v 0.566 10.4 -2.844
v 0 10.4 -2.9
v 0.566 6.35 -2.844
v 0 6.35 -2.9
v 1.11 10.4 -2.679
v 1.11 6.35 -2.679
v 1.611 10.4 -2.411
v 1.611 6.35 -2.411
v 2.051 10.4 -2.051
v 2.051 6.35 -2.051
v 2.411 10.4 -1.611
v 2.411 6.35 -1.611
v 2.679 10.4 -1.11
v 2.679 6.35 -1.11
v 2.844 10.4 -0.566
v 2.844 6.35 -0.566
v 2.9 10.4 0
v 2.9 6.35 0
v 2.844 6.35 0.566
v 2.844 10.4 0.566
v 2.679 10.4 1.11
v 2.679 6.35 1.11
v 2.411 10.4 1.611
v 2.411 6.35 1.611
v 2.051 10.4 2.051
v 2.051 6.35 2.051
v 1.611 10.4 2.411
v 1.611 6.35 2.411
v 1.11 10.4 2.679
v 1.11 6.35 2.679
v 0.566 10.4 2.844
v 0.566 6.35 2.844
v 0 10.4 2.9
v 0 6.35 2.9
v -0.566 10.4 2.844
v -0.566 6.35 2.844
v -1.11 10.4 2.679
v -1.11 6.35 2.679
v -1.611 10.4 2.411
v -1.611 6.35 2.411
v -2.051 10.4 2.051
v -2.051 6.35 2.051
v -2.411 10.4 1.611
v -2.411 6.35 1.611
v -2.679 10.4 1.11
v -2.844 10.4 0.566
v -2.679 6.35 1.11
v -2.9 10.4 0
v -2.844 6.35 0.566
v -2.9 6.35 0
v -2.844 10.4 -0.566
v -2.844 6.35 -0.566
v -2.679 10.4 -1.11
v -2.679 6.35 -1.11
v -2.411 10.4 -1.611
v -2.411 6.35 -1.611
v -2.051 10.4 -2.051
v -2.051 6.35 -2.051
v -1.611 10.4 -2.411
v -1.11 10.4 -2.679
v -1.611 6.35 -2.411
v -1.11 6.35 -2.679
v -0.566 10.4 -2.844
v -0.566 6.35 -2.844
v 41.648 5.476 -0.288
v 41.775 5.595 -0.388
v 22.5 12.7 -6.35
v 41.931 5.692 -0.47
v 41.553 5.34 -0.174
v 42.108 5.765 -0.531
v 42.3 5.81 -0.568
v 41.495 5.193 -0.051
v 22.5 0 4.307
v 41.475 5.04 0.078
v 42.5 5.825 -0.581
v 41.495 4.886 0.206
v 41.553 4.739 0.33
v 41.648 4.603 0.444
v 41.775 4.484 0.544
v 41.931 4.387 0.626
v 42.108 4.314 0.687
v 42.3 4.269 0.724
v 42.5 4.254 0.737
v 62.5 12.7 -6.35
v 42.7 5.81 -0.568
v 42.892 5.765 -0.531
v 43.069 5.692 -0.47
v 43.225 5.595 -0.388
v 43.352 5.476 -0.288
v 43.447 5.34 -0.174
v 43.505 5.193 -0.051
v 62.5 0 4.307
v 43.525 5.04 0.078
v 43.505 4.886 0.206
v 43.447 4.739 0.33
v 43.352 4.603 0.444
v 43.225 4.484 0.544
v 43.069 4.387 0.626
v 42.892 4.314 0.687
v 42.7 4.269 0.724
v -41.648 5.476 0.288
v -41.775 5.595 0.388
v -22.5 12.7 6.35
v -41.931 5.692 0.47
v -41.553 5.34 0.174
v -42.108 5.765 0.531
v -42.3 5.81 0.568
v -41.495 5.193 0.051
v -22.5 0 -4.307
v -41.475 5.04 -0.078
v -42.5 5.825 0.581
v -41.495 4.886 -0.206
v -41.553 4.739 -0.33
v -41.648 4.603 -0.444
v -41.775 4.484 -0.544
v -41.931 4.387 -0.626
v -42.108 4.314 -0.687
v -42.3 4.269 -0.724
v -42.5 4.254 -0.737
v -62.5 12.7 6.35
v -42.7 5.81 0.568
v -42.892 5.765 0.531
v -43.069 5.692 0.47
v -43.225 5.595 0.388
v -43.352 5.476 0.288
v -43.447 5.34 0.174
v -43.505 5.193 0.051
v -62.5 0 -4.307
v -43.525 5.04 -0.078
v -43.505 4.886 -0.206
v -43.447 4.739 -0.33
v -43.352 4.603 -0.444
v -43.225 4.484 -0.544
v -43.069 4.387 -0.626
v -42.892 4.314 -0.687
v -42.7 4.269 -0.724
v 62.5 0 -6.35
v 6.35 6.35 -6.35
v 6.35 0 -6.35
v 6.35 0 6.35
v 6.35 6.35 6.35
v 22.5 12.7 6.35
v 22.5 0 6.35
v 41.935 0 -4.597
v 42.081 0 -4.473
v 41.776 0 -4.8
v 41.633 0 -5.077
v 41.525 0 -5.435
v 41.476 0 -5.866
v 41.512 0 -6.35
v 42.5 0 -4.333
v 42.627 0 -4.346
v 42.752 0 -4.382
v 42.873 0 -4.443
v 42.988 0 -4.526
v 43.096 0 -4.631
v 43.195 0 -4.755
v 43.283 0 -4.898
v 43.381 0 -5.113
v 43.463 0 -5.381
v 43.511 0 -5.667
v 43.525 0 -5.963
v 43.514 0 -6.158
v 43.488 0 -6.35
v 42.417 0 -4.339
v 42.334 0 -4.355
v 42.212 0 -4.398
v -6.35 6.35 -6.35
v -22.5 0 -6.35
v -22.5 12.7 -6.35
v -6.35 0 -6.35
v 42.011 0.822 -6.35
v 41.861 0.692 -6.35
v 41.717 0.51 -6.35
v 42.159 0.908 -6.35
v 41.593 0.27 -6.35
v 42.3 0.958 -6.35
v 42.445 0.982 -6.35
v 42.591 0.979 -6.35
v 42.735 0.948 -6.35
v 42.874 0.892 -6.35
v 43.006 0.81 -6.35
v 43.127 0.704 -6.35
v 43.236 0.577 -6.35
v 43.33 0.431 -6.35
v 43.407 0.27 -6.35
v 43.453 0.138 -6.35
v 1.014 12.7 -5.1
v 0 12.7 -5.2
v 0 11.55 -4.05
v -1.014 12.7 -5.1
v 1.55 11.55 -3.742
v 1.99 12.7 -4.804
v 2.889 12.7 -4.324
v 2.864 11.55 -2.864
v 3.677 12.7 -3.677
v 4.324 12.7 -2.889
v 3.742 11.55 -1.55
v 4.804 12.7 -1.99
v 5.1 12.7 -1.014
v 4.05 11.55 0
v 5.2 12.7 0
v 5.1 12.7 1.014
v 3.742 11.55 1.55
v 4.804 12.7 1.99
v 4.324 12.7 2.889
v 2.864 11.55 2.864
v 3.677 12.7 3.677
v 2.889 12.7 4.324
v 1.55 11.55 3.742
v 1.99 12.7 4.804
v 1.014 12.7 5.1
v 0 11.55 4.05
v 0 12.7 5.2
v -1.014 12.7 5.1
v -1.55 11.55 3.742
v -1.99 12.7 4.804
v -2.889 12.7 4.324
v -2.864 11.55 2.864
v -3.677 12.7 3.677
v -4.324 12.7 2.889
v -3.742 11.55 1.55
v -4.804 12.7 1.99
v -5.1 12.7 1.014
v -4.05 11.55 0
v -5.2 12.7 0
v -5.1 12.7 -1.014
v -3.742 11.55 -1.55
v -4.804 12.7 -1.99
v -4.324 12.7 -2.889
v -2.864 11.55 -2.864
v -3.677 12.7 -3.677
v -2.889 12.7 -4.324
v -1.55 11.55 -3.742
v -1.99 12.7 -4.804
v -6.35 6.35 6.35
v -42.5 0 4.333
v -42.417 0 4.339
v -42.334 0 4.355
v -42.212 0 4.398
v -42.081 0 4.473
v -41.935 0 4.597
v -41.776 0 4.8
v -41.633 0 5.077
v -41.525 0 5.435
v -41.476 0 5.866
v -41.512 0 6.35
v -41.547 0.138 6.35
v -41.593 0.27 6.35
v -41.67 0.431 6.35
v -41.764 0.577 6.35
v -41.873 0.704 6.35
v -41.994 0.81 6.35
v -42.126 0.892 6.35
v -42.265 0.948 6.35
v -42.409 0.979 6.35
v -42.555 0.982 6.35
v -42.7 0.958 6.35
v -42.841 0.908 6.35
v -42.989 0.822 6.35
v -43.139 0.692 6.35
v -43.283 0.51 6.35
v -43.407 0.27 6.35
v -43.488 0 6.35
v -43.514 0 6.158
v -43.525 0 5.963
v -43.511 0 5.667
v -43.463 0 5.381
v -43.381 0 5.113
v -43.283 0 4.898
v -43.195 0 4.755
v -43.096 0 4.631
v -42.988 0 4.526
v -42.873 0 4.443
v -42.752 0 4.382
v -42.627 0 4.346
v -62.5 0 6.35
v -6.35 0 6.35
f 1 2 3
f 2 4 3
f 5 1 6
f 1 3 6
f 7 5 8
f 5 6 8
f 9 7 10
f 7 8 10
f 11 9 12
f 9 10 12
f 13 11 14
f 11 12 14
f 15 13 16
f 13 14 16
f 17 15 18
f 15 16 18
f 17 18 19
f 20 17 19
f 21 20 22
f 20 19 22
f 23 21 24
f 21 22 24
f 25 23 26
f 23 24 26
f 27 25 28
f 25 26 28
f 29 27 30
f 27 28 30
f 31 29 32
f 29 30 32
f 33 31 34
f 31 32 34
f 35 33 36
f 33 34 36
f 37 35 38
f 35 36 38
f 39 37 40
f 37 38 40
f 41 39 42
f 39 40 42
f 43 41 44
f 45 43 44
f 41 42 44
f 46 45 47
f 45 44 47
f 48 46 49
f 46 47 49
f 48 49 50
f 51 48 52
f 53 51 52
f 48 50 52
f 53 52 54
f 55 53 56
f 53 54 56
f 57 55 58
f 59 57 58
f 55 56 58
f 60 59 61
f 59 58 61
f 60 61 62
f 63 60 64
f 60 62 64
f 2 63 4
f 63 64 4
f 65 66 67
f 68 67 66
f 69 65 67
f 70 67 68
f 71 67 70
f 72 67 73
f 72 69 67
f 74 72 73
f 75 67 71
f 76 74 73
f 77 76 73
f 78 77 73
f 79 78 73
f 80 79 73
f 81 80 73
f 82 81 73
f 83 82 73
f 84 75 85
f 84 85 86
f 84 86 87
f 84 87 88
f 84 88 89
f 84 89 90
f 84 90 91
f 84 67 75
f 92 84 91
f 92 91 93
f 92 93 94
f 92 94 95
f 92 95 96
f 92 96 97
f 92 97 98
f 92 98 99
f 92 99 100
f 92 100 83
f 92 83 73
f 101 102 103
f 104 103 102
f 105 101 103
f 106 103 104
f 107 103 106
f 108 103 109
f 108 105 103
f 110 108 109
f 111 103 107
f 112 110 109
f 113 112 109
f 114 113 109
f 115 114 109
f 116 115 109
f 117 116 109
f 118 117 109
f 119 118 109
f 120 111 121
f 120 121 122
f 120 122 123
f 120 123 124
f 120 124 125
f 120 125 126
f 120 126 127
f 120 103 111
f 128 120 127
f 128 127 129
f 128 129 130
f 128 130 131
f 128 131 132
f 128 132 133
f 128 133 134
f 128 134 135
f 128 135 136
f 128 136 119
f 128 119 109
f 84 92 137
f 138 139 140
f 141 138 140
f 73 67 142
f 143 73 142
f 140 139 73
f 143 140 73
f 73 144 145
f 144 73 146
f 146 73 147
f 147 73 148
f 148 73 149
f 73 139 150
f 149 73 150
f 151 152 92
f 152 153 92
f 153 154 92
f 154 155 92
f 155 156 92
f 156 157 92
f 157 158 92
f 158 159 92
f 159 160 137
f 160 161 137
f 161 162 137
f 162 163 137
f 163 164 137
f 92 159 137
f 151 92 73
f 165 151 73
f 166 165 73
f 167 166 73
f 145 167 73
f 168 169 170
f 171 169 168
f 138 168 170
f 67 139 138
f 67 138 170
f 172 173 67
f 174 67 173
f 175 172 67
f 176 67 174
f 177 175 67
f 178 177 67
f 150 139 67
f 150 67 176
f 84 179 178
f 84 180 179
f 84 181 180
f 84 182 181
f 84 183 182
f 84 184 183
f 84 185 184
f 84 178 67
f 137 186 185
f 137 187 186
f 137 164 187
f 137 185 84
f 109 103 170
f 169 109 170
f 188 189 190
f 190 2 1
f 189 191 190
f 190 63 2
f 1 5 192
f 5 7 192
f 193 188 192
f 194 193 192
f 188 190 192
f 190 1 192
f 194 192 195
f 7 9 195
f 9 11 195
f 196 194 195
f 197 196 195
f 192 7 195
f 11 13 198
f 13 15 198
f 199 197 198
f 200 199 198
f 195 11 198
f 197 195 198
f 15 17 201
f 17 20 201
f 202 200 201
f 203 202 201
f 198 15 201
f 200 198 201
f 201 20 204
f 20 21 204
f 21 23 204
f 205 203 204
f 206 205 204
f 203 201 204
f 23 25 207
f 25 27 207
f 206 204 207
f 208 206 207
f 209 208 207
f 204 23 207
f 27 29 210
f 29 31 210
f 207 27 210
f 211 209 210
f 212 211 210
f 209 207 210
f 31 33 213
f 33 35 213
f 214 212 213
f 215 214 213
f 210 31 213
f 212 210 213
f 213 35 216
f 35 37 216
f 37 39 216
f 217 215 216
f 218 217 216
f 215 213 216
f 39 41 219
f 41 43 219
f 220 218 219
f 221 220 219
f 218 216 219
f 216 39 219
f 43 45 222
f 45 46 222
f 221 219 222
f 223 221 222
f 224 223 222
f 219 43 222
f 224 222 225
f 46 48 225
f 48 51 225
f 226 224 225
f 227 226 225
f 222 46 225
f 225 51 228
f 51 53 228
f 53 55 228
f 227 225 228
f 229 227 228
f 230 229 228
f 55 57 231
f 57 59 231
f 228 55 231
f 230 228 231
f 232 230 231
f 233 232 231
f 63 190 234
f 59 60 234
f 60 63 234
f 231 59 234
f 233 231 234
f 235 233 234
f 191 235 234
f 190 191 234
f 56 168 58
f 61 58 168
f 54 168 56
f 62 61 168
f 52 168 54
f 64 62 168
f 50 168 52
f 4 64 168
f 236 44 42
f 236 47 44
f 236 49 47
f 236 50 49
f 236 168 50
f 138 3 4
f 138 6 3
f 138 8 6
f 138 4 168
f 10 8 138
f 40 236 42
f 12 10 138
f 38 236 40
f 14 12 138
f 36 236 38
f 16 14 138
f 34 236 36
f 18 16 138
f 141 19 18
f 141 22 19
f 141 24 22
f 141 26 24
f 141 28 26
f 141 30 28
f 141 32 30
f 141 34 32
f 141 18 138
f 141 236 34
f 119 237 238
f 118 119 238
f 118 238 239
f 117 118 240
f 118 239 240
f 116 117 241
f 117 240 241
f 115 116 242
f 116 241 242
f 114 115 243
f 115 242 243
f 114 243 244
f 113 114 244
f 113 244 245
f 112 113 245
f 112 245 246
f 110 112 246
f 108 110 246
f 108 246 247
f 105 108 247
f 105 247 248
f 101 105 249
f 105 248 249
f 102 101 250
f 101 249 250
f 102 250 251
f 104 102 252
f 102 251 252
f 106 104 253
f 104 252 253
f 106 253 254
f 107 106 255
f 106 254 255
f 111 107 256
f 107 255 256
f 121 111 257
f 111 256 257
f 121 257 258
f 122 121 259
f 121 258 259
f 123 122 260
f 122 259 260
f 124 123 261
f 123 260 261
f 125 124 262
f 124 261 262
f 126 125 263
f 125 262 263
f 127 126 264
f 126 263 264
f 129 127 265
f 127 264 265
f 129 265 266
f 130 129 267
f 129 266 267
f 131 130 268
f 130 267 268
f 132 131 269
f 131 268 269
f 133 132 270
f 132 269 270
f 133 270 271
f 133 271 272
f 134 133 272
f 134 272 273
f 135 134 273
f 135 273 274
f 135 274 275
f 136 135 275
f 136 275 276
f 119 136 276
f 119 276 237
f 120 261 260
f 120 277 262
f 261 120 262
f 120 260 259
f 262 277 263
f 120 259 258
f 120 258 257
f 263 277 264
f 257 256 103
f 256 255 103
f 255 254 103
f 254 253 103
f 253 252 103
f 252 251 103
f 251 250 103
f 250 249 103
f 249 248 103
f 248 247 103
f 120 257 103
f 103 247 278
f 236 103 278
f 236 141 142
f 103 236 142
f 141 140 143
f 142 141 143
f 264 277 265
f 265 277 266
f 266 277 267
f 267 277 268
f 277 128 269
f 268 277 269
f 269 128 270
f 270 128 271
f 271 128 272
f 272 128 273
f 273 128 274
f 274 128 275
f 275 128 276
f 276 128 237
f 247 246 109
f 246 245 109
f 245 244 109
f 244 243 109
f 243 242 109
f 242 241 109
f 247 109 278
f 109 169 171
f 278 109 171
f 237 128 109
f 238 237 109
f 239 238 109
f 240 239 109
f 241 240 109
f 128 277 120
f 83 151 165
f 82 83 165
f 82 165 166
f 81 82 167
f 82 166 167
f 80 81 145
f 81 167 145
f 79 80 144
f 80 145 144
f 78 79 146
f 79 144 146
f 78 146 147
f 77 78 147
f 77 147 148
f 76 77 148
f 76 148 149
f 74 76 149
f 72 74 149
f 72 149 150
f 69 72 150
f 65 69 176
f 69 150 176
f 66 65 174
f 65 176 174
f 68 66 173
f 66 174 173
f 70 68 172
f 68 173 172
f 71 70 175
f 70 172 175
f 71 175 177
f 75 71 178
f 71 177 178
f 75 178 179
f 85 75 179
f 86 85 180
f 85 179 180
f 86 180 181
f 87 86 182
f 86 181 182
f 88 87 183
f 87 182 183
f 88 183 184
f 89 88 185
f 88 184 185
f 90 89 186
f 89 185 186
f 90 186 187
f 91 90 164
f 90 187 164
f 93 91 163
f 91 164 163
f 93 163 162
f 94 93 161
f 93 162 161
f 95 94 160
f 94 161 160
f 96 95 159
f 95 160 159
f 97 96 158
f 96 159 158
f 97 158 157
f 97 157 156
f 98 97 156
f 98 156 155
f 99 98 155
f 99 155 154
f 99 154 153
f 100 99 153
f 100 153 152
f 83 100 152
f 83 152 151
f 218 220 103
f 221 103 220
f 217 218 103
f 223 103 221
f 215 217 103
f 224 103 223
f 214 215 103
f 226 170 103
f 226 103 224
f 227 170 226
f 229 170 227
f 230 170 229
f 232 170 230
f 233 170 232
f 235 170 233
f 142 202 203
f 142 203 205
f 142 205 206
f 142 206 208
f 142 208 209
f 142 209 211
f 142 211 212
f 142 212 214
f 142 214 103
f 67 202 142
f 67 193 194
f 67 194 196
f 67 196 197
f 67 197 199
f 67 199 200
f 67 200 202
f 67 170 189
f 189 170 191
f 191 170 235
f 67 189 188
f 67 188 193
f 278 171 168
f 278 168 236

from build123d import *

# Parameters (mm, degrees)
SKETCH1_W                                       = 125
SKETCH1_H                                       = 12.7
BOSS_EXTRUDE1_DEPTH                             = 12.7
SKETCH2_W                                       = 12.7
SKETCH2_H                                       = 12.7
CUT_EXTRUDE1_DEPTH                              = 6.35
CSK_FOR_M5_FLAT_HEAD_MACHINE_SCREW1_D           = 5.8
CSK_FOR_M5_FLAT_HEAD_MACHINE_SCREW1_CSINK_D     = 10.4
CSK_FOR_M5_FLAT_HEAD_MACHINE_SCREW1_CSINK_ANGLE = 90
CUT_EXTRUDE2_DEPTH                              = 40
TAP_DRILL_FOR_M2_5X0_45_TAP1_D                  = 2.05
TAP_DRILL_FOR_M2_5X0_45_TAP1_DEPTH              = 8.164811475
CIRPATTERN1_COUNT                               = 2


with BuildPart() as part:
    # Sketch1 → Boss-Extrude1 (new body)
    with BuildSketch(Plane(origin=(0, 0, 0), x_dir=(1, 0, 0), z_dir=(0, 1, 0))):
        Rectangle(SKETCH1_W, SKETCH1_H)
    extrude(amount=BOSS_EXTRUDE1_DEPTH)

    # Sketch2 → Cut-Extrude1 (cut)
    with BuildSketch(Plane.XZ):
        Rectangle(SKETCH2_W, SKETCH2_H)
    extrude(amount=-CUT_EXTRUDE1_DEPTH, mode=Mode.SUBTRACT)

    # CSK for M5 Flat Head Machine Screw1 (through all)
    with Locations(Plane.ZX.offset(12.7)):
        with Locations((0, 0)):
            CounterSinkHole(CSK_FOR_M5_FLAT_HEAD_MACHINE_SCREW1_D / 2, CSK_FOR_M5_FLAT_HEAD_MACHINE_SCREW1_CSINK_D / 2, counter_sink_angle=CSK_FOR_M5_FLAT_HEAD_MACHINE_SCREW1_CSINK_ANGLE)

    # Sketch7 → Cut-Extrude2 (cut)
    with BuildSketch(Plane(origin=(62.5, 0, 0), x_dir=(0, 0, -1), z_dir=(1, 0, 0))):
        Polygon((6.35, 12.7), (-6.35, -2.435270626), (-6.35, 12.7), align=None)
    cut_extrude2 = extrude(amount=-CUT_EXTRUDE2_DEPTH, mode=Mode.SUBTRACT)

    # Tap Drill for M2.5x0.45 Tap1
    with Locations(Plane(origin=(42.5, 5.039555569, 0.077876097), x_dir=(0, 0.766044443119, -0.642787609687), z_dir=(0, 0.642787609687, 0.766044443119))):
        with Locations((0, 0)):
            tap_drill_for_m2_5x0_45_tap1 = Hole(TAP_DRILL_FOR_M2_5X0_45_TAP1_D / 2, depth=TAP_DRILL_FOR_M2_5X0_45_TAP1_DEPTH)

    # CirPattern1: Cut-Extrude2, Tap Drill for M2.5x0.45 Tap1 ×2 about axis
    cirpattern1_axis = Axis((0, 0, 0), (0, 1, 0))
    add([cut_extrude2.rotate(cirpattern1_axis, i * 360 / CIRPATTERN1_COUNT) for i in range(1, CIRPATTERN1_COUNT)], mode=Mode.SUBTRACT)
    add([tap_drill_for_m2_5x0_45_tap1.rotate(cirpattern1_axis, i * 360 / CIRPATTERN1_COUNT) for i in range(1, CIRPATTERN1_COUNT)], mode=Mode.SUBTRACT)


solid = part.part
